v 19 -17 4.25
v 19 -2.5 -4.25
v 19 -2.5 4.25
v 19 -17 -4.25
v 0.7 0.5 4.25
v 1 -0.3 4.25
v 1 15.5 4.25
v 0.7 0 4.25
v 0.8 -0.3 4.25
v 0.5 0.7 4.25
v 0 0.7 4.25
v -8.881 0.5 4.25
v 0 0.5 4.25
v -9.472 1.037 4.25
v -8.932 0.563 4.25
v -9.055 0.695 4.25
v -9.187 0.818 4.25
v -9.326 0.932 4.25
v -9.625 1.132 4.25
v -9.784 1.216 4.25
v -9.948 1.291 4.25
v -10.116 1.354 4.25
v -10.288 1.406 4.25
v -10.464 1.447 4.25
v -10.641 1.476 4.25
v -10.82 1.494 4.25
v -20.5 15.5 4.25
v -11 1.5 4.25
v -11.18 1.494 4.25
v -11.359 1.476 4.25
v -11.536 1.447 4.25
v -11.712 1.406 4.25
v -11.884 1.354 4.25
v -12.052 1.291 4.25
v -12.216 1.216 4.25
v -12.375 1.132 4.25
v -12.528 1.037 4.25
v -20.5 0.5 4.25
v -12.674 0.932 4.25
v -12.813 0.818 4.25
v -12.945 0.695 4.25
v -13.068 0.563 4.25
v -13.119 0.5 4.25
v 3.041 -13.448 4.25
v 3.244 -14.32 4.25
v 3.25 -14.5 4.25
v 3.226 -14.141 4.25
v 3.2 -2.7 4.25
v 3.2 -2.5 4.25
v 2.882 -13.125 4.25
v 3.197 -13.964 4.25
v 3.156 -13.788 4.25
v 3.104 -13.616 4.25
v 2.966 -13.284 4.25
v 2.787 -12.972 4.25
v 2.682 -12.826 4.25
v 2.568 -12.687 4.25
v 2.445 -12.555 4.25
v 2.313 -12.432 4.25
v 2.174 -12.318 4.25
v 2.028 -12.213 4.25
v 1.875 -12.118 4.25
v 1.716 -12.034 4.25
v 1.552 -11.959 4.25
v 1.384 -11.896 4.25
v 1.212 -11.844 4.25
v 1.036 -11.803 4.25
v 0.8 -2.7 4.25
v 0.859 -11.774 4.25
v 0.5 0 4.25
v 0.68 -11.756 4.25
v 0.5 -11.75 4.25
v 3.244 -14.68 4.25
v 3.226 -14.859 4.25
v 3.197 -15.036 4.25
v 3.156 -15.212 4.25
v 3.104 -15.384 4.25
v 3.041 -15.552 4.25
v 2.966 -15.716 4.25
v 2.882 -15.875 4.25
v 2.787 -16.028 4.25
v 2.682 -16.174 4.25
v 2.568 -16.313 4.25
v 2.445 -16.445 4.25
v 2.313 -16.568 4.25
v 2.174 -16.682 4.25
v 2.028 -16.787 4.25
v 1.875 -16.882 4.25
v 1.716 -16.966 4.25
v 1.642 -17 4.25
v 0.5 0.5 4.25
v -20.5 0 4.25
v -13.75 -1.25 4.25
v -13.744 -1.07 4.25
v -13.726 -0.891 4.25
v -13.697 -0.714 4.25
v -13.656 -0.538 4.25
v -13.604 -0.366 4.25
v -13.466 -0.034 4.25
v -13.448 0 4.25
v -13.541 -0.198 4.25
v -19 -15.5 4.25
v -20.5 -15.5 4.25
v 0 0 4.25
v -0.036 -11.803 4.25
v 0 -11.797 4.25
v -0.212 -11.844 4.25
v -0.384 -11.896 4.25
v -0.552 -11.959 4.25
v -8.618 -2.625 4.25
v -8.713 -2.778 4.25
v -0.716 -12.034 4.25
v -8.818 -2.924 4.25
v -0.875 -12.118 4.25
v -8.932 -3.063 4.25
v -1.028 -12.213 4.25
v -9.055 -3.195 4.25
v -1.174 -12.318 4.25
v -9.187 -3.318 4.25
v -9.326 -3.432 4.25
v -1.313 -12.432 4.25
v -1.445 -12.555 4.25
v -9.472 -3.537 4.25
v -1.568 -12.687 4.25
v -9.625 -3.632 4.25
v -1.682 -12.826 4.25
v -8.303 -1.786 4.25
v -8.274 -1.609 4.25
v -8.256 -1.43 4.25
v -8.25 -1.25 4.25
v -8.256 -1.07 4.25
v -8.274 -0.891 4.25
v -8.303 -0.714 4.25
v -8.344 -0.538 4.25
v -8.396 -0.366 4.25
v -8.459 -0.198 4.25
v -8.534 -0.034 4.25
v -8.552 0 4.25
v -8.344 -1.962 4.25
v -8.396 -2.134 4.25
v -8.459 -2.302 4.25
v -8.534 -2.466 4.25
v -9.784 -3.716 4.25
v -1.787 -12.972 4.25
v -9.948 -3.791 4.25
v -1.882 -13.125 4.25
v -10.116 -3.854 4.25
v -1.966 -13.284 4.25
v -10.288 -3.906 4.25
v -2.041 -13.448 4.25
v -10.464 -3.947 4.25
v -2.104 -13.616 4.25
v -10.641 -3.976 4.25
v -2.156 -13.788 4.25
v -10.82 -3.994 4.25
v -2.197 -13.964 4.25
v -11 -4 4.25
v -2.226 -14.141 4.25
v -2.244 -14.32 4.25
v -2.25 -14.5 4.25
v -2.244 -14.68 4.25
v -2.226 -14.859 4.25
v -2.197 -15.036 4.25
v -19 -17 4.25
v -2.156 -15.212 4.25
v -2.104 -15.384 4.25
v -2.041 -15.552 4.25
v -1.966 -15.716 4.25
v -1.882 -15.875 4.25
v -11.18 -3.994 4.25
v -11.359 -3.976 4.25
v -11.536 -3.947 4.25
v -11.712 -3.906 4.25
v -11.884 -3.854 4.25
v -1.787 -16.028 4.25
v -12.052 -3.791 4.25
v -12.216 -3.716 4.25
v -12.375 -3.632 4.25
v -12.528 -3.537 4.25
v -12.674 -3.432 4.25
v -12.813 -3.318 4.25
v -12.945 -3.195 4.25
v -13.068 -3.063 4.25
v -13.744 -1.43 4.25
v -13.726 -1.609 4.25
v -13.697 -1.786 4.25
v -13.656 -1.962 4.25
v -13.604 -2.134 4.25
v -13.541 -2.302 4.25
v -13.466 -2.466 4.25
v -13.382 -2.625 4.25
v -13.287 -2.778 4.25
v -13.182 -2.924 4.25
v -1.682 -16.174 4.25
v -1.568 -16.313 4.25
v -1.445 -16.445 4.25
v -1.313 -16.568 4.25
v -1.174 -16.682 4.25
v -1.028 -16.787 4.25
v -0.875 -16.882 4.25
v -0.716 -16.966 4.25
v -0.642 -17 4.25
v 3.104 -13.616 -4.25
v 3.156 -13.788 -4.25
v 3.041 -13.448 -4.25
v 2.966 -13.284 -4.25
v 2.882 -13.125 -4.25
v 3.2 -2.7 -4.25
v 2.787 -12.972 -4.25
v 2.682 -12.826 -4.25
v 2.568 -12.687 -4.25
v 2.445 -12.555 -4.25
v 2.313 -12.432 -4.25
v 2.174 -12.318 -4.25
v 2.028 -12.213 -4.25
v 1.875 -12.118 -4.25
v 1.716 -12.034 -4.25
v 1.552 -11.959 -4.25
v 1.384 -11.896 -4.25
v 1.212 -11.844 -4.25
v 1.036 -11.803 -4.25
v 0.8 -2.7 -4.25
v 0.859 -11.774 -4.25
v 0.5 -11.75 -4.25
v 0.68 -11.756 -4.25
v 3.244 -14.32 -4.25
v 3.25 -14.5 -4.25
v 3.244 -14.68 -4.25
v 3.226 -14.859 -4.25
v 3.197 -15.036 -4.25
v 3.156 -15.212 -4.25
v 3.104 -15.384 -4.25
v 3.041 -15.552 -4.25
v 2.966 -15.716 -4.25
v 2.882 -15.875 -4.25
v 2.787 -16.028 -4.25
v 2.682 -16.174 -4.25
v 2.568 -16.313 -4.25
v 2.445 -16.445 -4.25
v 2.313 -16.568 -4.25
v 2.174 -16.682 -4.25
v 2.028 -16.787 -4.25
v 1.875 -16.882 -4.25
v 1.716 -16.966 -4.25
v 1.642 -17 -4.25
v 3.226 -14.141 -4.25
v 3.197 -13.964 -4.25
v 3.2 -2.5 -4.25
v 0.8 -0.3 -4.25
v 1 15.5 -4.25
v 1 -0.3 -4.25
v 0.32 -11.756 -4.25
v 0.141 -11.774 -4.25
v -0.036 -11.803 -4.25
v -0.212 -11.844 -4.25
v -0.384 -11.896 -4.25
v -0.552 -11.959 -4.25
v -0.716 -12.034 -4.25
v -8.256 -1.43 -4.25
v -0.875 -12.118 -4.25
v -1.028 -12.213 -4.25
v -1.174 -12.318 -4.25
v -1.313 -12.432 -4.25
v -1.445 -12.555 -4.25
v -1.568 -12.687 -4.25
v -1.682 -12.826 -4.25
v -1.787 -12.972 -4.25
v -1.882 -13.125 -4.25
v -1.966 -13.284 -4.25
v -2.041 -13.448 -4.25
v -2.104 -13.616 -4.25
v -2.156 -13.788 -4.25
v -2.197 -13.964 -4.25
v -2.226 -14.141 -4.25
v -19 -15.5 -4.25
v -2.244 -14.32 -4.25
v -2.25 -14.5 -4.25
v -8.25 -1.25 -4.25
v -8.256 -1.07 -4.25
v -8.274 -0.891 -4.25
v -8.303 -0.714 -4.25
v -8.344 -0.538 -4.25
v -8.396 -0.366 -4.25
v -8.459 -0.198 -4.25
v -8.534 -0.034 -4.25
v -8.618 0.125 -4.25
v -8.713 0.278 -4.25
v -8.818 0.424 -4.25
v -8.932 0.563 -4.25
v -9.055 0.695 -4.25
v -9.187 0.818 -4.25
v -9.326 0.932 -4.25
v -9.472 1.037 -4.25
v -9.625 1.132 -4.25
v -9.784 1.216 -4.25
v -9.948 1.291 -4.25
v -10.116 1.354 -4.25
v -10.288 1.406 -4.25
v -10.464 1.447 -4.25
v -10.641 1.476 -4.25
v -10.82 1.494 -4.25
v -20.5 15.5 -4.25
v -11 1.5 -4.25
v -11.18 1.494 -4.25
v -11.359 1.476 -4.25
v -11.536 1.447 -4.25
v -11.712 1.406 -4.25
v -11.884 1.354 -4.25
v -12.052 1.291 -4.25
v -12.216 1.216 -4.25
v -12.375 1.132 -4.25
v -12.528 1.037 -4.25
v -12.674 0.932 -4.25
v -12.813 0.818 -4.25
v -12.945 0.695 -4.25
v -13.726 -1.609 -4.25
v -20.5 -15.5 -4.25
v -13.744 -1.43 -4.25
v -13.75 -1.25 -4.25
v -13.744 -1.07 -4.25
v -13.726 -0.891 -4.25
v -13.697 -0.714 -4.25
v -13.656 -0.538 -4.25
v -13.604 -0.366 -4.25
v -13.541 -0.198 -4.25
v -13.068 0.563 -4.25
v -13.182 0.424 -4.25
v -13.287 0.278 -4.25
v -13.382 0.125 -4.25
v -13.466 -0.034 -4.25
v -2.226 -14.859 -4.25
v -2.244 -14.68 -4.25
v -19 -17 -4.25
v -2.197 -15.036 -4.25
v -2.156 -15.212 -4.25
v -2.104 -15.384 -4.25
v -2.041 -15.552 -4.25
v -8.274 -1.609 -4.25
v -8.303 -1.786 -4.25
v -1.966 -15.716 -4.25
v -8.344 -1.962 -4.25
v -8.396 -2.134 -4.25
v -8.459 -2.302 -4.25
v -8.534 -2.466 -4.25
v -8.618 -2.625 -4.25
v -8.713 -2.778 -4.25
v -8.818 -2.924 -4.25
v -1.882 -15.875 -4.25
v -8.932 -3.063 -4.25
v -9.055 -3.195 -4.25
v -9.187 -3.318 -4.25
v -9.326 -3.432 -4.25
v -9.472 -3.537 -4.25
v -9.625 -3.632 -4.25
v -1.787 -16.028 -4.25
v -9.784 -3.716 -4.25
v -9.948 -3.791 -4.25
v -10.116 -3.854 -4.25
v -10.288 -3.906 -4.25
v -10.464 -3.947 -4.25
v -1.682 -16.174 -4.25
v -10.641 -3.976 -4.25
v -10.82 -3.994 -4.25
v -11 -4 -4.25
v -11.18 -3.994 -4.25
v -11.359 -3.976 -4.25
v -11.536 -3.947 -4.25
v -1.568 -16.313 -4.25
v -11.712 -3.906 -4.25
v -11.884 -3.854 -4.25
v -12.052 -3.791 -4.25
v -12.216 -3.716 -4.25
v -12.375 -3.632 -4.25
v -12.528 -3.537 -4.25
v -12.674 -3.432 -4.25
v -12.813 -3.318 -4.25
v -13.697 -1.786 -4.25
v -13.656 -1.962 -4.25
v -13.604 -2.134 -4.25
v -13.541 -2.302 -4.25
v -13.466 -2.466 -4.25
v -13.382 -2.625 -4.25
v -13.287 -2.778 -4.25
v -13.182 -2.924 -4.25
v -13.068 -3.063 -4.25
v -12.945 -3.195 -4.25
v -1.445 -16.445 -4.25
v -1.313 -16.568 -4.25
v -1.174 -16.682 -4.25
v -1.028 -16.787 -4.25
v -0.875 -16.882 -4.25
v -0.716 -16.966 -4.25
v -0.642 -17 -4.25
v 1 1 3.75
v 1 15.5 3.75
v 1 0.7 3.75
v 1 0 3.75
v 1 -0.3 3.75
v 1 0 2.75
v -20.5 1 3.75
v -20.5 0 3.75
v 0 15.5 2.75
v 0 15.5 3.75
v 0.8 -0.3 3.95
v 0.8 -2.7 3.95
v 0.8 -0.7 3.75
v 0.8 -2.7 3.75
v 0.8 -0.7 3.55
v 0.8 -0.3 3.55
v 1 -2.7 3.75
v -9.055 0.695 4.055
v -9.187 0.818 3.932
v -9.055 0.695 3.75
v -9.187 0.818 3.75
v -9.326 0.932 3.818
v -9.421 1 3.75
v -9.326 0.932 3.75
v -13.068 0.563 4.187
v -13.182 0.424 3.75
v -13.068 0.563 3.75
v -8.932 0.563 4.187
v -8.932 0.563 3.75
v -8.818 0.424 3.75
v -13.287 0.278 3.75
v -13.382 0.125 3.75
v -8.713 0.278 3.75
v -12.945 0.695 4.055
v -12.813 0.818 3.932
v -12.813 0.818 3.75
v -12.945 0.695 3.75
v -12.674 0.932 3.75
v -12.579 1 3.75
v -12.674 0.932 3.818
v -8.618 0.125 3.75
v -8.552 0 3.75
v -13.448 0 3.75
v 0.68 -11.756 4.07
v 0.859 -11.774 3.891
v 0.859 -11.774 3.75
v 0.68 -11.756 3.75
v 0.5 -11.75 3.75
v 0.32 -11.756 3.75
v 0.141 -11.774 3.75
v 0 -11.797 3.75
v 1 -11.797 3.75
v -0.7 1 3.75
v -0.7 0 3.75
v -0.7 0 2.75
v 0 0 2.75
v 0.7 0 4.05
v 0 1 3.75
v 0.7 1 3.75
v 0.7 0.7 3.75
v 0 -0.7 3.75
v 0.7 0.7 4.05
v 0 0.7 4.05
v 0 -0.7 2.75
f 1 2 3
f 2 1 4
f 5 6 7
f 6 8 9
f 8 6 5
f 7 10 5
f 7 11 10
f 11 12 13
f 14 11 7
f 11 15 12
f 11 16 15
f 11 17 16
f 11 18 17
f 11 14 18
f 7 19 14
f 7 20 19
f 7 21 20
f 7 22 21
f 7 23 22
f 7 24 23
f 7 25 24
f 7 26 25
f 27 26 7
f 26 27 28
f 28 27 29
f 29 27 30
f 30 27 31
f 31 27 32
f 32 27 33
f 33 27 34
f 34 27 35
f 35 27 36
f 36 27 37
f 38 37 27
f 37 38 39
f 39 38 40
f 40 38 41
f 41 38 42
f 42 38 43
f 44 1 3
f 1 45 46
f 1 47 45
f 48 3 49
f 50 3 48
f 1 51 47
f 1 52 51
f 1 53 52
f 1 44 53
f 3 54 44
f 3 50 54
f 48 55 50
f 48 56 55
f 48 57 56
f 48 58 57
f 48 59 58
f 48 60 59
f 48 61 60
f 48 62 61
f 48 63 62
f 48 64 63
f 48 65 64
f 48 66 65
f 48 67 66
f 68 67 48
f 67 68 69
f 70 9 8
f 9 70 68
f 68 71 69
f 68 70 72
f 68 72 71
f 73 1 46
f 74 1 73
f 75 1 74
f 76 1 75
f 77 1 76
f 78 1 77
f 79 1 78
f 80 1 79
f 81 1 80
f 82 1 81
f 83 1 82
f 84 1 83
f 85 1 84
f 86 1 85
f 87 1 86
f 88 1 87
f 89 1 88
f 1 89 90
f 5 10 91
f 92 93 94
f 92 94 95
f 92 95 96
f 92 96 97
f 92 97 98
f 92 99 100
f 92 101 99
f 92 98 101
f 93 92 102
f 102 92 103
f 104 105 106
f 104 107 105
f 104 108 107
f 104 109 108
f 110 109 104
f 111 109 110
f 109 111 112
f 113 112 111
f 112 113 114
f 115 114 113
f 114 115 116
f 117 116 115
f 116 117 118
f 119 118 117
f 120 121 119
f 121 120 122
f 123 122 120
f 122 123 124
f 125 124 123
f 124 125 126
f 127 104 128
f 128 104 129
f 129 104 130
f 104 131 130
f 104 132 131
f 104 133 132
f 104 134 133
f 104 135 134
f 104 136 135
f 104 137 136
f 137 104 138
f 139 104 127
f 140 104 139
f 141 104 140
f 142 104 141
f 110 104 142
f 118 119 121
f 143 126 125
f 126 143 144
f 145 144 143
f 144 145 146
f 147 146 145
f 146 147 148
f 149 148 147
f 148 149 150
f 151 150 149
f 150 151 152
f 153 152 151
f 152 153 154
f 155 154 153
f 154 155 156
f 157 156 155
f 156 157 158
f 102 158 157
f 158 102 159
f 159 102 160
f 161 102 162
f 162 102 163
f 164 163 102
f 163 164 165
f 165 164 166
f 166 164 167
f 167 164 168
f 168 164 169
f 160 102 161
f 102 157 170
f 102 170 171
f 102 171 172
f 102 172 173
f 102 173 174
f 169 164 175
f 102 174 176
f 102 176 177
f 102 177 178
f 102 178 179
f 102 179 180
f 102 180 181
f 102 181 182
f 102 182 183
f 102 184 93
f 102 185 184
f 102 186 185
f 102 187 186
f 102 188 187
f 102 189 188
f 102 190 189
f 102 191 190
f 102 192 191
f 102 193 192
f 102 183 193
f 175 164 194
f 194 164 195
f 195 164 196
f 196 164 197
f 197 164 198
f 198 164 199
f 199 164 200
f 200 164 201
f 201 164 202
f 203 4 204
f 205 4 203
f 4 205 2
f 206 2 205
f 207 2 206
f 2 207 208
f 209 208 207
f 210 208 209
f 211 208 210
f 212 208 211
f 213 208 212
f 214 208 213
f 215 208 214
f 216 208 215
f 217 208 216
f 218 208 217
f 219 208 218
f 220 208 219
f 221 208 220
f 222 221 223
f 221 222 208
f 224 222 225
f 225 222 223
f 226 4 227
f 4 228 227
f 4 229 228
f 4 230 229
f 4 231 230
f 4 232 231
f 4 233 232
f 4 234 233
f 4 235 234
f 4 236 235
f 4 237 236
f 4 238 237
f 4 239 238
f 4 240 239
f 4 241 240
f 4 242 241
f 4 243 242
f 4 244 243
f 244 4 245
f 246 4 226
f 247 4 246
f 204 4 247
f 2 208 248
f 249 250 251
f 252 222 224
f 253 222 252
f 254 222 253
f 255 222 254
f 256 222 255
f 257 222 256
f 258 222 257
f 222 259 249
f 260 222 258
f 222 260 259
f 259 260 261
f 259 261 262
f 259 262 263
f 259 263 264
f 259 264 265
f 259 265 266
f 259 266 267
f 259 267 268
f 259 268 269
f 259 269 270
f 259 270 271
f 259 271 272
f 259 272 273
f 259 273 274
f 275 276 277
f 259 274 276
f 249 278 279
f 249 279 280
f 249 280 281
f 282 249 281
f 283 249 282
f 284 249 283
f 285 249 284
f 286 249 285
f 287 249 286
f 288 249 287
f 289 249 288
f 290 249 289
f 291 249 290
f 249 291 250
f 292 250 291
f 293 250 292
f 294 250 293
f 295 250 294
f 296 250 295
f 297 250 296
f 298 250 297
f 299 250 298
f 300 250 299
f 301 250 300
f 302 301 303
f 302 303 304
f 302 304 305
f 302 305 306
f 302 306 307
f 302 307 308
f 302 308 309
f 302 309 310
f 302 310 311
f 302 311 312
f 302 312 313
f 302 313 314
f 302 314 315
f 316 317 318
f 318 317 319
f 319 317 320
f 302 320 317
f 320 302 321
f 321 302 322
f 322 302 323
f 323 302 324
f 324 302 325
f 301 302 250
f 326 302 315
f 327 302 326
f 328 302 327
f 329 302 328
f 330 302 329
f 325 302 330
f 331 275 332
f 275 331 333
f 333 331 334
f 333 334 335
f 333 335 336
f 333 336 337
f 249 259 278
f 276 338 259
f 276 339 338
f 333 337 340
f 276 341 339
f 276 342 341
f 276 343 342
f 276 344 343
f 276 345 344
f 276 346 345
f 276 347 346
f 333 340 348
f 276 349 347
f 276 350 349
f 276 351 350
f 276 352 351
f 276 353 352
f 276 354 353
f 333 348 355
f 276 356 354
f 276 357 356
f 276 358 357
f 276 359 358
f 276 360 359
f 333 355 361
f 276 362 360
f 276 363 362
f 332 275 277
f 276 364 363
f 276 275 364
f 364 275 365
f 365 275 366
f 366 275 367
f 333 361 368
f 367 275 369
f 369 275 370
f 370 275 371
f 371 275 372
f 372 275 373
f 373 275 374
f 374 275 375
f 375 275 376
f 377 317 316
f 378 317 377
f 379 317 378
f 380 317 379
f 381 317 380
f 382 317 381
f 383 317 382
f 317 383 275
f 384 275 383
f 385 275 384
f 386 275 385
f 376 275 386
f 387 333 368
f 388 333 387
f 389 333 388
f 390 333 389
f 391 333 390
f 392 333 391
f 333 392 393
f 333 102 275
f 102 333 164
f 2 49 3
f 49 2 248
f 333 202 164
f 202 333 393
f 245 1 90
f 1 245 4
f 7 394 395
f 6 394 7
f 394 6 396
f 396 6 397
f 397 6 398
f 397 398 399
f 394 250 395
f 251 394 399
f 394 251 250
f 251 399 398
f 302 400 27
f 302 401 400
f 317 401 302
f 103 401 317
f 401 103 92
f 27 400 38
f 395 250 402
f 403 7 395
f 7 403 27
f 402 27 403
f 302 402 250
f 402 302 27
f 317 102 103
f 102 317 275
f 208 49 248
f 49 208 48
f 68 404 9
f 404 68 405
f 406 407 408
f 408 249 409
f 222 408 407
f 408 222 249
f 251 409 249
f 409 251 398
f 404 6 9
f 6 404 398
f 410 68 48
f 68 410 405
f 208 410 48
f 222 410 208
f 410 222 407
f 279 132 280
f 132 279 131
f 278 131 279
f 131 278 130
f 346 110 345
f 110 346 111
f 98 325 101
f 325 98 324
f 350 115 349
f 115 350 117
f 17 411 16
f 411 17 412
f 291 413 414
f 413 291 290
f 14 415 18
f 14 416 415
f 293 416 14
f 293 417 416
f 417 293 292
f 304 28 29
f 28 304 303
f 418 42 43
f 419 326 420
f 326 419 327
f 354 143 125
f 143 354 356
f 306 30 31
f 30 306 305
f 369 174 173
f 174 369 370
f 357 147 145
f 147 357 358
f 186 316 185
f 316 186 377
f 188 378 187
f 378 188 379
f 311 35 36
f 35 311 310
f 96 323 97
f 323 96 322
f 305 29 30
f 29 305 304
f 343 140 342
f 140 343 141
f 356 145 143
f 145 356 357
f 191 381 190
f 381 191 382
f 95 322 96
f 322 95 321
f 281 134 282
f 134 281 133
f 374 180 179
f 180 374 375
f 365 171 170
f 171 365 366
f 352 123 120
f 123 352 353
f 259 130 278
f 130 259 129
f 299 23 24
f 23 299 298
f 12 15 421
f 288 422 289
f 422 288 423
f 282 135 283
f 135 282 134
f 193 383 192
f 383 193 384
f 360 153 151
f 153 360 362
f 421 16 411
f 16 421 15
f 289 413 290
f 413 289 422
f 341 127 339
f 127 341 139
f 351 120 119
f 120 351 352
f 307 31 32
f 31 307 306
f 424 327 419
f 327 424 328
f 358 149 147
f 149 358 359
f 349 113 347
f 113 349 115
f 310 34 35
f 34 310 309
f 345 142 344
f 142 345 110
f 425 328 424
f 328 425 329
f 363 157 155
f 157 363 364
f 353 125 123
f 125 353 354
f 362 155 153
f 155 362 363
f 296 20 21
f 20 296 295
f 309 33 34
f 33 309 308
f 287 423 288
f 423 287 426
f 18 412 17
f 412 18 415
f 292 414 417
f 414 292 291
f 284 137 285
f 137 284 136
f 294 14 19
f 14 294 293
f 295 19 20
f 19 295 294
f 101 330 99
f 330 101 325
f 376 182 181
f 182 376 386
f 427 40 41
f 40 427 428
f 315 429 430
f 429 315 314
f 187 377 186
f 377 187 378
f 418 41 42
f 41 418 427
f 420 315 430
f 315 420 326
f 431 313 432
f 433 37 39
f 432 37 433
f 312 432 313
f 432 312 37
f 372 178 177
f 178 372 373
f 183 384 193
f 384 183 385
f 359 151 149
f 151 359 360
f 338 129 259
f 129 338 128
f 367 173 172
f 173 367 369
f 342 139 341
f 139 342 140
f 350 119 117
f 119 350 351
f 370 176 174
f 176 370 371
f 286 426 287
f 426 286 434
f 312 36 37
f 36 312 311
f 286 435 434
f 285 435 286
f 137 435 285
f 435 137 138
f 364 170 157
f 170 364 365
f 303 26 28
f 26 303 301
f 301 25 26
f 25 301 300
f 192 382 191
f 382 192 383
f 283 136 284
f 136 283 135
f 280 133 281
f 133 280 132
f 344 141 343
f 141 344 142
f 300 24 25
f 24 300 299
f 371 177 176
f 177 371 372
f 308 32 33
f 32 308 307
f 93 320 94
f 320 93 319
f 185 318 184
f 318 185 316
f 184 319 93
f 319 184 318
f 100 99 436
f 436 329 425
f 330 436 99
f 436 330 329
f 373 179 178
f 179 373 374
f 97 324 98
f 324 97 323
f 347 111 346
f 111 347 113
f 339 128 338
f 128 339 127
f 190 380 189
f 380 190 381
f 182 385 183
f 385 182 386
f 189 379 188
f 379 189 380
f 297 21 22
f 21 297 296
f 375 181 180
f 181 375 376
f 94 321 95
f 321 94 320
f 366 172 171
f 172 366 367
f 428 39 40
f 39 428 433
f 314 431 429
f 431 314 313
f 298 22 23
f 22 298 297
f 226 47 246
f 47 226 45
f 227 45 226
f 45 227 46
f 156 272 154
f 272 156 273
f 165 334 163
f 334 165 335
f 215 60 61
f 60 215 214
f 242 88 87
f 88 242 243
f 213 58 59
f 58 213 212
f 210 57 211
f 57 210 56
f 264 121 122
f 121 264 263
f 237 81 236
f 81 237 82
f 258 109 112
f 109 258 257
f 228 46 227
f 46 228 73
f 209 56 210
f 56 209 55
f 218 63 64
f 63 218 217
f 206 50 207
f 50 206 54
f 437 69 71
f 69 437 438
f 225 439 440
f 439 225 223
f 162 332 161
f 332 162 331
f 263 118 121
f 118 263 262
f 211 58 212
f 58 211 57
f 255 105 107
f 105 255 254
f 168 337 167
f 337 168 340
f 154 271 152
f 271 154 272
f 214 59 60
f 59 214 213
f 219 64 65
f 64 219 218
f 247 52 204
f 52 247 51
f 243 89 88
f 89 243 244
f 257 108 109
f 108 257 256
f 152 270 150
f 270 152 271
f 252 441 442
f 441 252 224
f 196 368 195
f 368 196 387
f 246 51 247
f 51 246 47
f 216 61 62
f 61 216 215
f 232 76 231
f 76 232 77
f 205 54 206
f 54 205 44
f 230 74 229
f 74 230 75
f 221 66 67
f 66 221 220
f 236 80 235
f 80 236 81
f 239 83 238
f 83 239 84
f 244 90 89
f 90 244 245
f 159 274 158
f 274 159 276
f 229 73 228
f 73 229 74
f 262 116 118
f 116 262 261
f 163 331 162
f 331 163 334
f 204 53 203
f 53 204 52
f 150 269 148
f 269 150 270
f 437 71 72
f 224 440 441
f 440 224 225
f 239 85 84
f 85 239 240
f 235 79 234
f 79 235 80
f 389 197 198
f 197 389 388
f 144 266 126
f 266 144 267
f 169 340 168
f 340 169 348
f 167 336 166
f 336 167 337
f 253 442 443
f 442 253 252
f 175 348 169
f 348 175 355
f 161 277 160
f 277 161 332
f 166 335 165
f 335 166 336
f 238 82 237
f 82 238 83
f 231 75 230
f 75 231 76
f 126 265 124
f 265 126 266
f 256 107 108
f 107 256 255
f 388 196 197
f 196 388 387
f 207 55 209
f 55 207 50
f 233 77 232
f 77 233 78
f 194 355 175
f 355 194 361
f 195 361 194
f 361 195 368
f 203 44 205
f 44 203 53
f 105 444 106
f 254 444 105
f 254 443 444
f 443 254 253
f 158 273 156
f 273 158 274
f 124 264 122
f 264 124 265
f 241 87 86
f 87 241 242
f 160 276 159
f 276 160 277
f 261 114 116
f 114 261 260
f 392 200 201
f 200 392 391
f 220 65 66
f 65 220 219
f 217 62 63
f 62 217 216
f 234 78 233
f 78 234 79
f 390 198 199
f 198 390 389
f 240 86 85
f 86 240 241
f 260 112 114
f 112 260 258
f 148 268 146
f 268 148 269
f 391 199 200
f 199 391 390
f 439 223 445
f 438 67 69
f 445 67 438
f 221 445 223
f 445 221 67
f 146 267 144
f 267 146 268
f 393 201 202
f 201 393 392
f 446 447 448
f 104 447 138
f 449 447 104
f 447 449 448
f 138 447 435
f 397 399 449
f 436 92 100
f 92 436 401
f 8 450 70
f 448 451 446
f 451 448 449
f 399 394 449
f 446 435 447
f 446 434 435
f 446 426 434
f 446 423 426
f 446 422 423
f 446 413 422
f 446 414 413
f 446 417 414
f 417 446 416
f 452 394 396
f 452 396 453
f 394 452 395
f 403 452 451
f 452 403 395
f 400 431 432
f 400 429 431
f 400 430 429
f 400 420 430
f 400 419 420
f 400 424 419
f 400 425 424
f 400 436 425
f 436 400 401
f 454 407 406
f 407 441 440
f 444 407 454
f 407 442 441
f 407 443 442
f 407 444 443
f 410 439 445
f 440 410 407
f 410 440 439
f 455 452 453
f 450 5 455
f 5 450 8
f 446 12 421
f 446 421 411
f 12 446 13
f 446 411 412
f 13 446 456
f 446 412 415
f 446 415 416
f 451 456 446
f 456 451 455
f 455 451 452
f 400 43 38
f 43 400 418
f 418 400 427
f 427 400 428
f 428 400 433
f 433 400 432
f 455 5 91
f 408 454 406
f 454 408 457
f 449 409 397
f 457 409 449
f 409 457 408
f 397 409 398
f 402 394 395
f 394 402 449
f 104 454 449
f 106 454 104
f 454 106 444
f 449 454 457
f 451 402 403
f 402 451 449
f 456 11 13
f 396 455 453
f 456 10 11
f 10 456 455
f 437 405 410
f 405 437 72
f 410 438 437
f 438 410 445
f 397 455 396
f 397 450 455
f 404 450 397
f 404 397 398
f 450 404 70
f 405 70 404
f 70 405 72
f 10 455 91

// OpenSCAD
$fn = 96;

// Target overall bounding size (X,Y,Z)
overall_length = 38;   // X
overall_width  = 31;   // Y
thickness      = 8.5;  // Z

// Bracket geometry (L-shape)
inner_corner_cutout_size = 18;   // square removed from one corner to form the L

// Mounting holes
hole_diameter = 5.5;
hole_center_offset_from_inner_corner = 12; // from inner corner along each leg

// Edge details
inner_corner_radius = 2;   // inside corner fillet radius (2D)
edge_chamfer = 1;          // top-edge chamfer (approx)

// Robust booleans + guaranteed physical attachment overlap
eps = 0.2;
attach_overlap = 1.5;      // 1–2mm overlap to guarantee connection

module chamfer_top_edges(x, y, z, c) {
  difference() {
    children();

    // Along +X edge (full Y)
    translate([ x/2 - c/2, 0, z/2 - c/2 ])
      rotate([0, 90, 0])
        linear_extrude(height = x + 2*eps, center = true)
          polygon(points=[[0,0],[c,0],[0,c]]);

    // Along -X edge (full Y)
    translate([ -x/2 + c/2, 0, z/2 - c/2 ])
      rotate([0, -90, 0])
        linear_extrude(height = x + 2*eps, center = true)
          polygon(points=[[0,0],[c,0],[0,c]]);

    // Along +Y edge (full X)
    translate([ 0, y/2 - c/2, z/2 - c/2 ])
      rotate([-90, 0, 0])
        linear_extrude(height = y + 2*eps, center = true)
          polygon(points=[[0,0],[c,0],[0,c]]);

    // Along -Y edge (full X)
    translate([ 0, -y/2 + c/2, z/2 - c/2 ])
      rotate([90, 0, 0])
        linear_extrude(height = y + 2*eps, center = true)
          polygon(points=[[0,0],[c,0],[0,c]]);
  }
}

module extrusion_bracket() {

  // Inner corner (where the cutout starts) in XY, for consistent placement
  inner_x = overall_length/2 - inner_corner_cutout_size;
  inner_y = overall_width/2  - inner_corner_cutout_size;

  chamfer_top_edges(overall_length, overall_width, thickness, edge_chamfer)
  difference() {

    // --- SOLID BODY (unioned) ---
    // Build the L as two rectangles that OVERLAP by 1–2mm at the joint.
    // This fixes the "right-side plate/arm floating" and the visible gap/step.
    union() {
      // X-leg: full length in X, reduced width in Y (bottom band)
      // Centered so its top edge reaches inner_y, plus overlap into the Y-leg.
      translate([
        0,
        (-overall_width/2 + inner_y)/2 - attach_overlap/2,
        0
      ])
        cube([
          overall_length,
          (overall_width - inner_corner_cutout_size) + attach_overlap,
          thickness
        ], center=true);

      // Y-leg: full width in Y, reduced length in X (left band)
      // Centered so its right edge reaches inner_x, plus overlap into the X-leg.
      translate([
        (-overall_length/2 + inner_x)/2 - attach_overlap/2,
        0,
        0
      ])
        cube([
          (overall_length - inner_corner_cutout_size) + attach_overlap,
          overall_width,
          thickness
        ], center=true);
    }

    // --- Inside corner fillet: remove a quarter-cylinder at the inner corner of the L ---
    translate([ inner_x, inner_y, 0 ])
      difference() {
        translate([inner_corner_radius/2, inner_corner_radius/2, 0])
          cube([inner_corner_radius + 2*eps, inner_corner_radius + 2*eps, thickness + 2*eps], center=true);

        translate([inner_corner_radius, inner_corner_radius, 0])
          cylinder(r=inner_corner_radius, h=thickness + 4*eps, center=true);
      }

    // --- Two through holes, measured from the inner corner along each leg ---
    // Hole on X-leg (to the left of inner corner, centered in remaining Y leg thickness)
    translate([
      inner_x - hole_center_offset_from_inner_corner,
      inner_y/2,
      0
    ])
      cylinder(r=hole_diameter/2, h=thickness + 2*eps, center=true);

    // Hole on Y-leg (below inner corner, centered in remaining X leg thickness)
    translate([
      inner_x/2,
      inner_y - hole_center_offset_from_inner_corner,
      0
    ])
      cylinder(r=hole_diameter/2, h=thickness + 2*eps, center=true);
  }
}

extrusion_bracket();
